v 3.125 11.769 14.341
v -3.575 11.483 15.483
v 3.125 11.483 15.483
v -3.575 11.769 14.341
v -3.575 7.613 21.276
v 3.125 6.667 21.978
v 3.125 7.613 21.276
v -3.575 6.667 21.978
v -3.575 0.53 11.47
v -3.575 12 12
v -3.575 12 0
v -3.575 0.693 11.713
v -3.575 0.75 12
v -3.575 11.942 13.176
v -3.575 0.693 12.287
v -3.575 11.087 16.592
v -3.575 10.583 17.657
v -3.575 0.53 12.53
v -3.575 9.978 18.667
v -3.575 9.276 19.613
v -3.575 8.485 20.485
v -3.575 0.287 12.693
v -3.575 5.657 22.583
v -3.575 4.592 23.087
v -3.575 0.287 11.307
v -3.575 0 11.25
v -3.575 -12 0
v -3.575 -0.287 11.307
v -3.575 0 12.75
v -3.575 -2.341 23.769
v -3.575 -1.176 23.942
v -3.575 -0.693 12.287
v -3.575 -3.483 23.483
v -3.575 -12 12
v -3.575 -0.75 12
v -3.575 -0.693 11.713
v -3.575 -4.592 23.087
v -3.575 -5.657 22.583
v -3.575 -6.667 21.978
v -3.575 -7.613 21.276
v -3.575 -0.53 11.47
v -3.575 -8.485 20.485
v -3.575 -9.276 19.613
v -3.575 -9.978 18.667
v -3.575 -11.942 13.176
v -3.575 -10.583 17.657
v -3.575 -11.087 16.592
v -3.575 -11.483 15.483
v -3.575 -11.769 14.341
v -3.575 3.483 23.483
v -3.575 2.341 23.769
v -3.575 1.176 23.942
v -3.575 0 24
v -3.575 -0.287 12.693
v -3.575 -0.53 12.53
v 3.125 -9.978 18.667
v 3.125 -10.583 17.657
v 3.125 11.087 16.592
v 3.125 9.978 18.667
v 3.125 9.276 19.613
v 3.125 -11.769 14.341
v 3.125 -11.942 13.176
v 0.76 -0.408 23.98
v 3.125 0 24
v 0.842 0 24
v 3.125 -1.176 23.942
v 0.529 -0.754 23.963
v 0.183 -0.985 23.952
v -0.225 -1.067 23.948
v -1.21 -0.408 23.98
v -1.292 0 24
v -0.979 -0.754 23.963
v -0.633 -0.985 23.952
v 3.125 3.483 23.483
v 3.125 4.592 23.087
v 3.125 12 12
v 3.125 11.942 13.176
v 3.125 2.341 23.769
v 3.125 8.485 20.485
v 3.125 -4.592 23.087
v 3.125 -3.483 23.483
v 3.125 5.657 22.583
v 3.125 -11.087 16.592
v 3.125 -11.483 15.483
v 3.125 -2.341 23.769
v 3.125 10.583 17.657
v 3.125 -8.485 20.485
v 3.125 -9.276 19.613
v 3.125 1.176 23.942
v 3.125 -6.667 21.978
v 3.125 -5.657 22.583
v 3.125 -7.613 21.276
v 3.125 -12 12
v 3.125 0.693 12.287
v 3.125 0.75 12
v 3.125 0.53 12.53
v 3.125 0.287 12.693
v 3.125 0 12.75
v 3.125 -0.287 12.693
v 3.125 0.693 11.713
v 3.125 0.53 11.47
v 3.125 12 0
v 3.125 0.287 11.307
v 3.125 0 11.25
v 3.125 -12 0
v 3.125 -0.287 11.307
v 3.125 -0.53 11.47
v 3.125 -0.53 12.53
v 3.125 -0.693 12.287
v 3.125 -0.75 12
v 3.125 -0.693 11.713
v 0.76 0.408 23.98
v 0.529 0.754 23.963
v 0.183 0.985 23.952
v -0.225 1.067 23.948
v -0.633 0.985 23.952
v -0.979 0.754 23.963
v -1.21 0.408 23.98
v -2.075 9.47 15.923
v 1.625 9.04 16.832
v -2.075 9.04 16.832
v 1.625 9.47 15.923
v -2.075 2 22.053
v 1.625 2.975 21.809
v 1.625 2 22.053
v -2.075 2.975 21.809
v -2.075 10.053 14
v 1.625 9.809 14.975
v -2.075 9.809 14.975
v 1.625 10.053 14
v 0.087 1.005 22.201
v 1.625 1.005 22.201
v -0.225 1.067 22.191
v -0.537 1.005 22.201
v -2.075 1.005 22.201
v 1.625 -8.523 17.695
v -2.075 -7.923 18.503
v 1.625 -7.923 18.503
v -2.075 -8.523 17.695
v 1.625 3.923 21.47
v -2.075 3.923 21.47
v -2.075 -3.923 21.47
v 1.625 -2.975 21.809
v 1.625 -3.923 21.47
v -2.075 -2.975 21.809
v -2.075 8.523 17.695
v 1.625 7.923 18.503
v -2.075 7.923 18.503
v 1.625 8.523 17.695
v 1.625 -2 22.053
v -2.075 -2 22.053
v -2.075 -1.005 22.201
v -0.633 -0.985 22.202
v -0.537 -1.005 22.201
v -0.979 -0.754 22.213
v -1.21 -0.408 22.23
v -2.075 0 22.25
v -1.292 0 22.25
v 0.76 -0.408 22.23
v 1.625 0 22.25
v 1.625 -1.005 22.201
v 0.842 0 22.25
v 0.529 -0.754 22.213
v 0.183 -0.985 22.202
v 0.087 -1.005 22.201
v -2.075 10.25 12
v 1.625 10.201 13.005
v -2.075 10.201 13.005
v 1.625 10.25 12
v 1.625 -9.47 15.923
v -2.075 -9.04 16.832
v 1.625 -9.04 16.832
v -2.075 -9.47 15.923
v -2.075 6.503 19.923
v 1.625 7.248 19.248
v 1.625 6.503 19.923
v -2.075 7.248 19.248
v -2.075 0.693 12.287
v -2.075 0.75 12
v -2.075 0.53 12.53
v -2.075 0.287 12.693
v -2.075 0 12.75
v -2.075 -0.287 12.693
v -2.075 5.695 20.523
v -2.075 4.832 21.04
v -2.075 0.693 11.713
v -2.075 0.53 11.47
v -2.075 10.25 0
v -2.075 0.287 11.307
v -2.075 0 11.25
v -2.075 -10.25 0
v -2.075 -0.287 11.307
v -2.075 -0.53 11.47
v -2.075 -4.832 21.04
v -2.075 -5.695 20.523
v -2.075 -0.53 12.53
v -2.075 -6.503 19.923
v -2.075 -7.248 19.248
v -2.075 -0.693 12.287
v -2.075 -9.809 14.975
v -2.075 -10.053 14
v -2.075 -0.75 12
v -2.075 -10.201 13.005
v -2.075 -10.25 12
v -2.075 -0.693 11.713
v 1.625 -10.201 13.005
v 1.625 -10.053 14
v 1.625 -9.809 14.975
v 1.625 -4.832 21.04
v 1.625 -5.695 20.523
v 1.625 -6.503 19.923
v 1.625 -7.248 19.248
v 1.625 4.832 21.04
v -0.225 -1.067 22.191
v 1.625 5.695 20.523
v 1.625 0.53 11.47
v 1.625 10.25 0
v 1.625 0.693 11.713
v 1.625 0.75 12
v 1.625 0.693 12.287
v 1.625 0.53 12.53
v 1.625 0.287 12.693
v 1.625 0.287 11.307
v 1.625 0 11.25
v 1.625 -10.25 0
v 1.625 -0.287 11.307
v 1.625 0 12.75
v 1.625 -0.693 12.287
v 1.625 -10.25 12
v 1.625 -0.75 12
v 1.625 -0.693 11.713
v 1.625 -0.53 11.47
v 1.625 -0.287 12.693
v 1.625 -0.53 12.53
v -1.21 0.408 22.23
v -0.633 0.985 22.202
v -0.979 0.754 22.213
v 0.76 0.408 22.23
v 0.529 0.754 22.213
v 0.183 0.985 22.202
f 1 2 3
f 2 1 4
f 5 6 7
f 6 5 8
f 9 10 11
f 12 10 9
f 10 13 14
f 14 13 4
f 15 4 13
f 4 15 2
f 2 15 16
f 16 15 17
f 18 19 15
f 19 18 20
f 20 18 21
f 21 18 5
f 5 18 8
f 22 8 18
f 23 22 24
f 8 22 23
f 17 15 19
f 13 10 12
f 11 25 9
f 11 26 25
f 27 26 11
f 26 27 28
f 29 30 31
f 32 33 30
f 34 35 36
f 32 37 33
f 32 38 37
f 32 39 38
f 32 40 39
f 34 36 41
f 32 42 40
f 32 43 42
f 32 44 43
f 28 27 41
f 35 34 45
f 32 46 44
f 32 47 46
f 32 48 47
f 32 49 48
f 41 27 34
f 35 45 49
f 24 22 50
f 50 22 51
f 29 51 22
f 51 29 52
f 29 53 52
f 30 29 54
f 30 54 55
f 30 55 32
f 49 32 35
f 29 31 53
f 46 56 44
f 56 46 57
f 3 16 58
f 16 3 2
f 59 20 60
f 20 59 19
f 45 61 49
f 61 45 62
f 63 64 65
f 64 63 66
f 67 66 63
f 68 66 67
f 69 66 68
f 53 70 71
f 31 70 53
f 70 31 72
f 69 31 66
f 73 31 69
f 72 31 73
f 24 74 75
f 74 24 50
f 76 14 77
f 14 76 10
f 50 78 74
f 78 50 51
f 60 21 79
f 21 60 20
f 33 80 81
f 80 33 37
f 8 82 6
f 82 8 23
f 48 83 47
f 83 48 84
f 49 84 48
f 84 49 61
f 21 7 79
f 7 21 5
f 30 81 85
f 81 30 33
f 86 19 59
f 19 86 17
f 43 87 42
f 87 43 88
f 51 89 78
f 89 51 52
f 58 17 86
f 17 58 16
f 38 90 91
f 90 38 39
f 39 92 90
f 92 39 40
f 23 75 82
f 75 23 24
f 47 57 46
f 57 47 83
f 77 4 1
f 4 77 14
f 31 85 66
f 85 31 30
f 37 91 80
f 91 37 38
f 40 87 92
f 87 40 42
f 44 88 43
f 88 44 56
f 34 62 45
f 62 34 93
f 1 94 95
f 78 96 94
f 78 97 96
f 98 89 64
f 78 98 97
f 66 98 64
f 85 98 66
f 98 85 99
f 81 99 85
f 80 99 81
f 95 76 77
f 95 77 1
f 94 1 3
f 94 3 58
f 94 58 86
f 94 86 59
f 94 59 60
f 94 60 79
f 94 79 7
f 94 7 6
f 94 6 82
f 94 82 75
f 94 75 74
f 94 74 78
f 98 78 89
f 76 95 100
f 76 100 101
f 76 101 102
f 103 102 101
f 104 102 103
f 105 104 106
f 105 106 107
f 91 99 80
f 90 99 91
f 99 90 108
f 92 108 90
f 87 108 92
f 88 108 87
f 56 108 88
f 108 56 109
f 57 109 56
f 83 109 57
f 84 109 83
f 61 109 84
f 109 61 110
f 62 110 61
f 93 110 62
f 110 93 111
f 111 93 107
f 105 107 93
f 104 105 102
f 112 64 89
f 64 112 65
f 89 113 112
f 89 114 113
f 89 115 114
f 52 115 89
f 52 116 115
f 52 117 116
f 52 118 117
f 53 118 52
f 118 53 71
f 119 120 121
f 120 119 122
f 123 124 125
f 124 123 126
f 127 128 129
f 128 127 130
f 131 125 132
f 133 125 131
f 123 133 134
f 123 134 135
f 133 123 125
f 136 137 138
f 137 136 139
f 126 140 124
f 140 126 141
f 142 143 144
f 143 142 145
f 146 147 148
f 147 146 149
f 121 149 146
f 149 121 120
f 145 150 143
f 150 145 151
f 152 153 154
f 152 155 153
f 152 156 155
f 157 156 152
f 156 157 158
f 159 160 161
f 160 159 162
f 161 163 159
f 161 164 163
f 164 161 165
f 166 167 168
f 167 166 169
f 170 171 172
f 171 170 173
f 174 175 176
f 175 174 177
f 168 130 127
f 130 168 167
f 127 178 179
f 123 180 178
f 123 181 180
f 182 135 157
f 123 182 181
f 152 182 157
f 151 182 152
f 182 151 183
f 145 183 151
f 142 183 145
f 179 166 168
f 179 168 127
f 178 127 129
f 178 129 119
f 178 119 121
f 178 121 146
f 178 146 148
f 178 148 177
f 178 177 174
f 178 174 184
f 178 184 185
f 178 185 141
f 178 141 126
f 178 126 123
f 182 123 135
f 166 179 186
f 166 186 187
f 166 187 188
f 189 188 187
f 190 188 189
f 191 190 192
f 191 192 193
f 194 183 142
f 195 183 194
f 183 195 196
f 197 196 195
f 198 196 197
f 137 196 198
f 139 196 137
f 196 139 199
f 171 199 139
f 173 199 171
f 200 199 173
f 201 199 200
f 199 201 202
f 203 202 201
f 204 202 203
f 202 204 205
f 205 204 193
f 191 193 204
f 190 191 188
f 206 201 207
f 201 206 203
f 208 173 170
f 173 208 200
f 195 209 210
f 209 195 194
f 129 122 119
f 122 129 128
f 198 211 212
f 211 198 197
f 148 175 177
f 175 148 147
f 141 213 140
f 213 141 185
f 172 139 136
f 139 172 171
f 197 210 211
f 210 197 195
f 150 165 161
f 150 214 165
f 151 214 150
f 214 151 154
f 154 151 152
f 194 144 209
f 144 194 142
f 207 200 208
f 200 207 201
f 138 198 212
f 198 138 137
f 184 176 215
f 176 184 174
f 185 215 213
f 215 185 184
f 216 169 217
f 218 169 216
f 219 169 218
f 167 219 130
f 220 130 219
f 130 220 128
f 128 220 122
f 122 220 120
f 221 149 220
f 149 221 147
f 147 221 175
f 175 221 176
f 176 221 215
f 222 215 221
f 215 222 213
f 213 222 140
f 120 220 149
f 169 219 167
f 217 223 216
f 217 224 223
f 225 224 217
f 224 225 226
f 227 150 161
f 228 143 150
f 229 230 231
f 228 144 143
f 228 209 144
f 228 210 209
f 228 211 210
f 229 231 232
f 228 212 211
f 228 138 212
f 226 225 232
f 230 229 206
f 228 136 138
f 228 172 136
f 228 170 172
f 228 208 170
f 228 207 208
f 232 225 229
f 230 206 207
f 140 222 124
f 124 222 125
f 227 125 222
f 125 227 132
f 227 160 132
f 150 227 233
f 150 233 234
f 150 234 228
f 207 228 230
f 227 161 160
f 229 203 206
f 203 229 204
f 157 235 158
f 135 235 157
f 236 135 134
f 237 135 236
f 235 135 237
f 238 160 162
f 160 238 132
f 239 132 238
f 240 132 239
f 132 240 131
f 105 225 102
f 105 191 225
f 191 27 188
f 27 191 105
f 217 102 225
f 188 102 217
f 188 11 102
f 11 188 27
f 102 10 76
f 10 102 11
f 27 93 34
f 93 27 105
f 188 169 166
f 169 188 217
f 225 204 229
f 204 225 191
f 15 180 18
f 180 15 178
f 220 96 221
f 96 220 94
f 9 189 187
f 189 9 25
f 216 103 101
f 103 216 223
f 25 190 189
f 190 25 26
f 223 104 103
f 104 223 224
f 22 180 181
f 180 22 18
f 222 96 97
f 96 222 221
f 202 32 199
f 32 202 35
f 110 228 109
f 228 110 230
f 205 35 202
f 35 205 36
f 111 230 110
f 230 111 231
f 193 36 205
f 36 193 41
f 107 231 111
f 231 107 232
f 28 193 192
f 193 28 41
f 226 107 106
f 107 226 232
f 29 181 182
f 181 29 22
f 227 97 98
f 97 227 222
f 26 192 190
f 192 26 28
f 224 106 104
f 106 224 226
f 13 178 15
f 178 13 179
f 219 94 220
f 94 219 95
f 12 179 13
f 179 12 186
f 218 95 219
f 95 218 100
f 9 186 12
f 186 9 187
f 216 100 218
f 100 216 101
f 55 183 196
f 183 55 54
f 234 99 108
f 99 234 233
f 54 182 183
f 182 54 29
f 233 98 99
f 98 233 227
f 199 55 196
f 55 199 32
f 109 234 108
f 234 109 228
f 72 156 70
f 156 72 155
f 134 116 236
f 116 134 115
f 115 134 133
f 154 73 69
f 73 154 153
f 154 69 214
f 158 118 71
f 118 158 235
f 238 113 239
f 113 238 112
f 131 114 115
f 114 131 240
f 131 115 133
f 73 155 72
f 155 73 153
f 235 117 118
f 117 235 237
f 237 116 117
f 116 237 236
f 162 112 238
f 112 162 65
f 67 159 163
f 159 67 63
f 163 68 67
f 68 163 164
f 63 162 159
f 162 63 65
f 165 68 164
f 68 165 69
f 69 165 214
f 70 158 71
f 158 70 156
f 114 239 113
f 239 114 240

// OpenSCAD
/*Battery dimensions in mm
CR1225 cell holder: 
 diameter=12mm 
 height=2.5mm 
 tolerance=0.5mm 
 wall thickness=2mm 

CR2032 cell holder: 
 diameter=20mm 
 height=3.2mm 
 tolerance=0.5mm 
 wall thickness=2mm 
*/

battery_diameter	=20.0;	// Diameter of battery
battery_height		=3.2;	// Thickness of battery
tolerance			=0.5;	// Make things a little looser
wall_thickness		=1.5;	// Wall thickness
wire_diameter		=1.5;	// Thickness of wire openings
extra_length		=2.0;	// Extends the open outwards to "hide" the battery a little bit
number_of_cells	=1;		// How many cells will be stacked

rotate([0,90,0])
{
	// Move to propper hieght and orientation
	translate([-battery_diameter/2-extra_length,0,-(battery_height*number_of_cells)-(wall_thickness/4)])
	{
		difference()
		{
			union()
			{
				difference()
				{
					// Main block
					cylinder(r=(battery_diameter/2)+tolerance+wall_thickness, h=battery_height*number_of_cells+(tolerance)+(2*wall_thickness),$fn=64);
					// Battery shape
					translate([0,0,wall_thickness])
						cylinder(r=(battery_diameter/2)+(tolerance/2), h=battery_height*number_of_cells+tolerance,$fn=64);
					// Square opening 
					translate([0,-((battery_diameter/2)+2+tolerance),0])
						cube([battery_diameter+10,battery_diameter*number_of_cells+5,battery_height*number_of_cells+5]);
				}
				difference()
				{
					// Square extension
					translate([0,-((battery_diameter/2)+wall_thickness+tolerance),0])
						cube([battery_diameter/2+extra_length,battery_diameter+(2*wall_thickness)+(2*tolerance),battery_height*number_of_cells+(2*wall_thickness)+tolerance]);
					// Square hole in end
					translate([0,-((battery_diameter/2))-(tolerance/2),wall_thickness])
						cube([battery_diameter+tolerance,battery_diameter+tolerance,battery_height*number_of_cells+tolerance]);
				}
			}
			// Wire holes
			translate([0,0,-1])
				cylinder(r=wire_diameter/2, h=battery_height*number_of_cells+tolerance+10,$fn=16);
			// Battery "push out" hole
			translate([-battery_diameter/2-wall_thickness-1,0,wall_thickness+(battery_height*number_of_cells/2)+tolerance/2])
				rotate([0,90,0])
					cylinder(r=battery_height/3,h=wall_thickness+1,$fn=16);
		}
	}
}



